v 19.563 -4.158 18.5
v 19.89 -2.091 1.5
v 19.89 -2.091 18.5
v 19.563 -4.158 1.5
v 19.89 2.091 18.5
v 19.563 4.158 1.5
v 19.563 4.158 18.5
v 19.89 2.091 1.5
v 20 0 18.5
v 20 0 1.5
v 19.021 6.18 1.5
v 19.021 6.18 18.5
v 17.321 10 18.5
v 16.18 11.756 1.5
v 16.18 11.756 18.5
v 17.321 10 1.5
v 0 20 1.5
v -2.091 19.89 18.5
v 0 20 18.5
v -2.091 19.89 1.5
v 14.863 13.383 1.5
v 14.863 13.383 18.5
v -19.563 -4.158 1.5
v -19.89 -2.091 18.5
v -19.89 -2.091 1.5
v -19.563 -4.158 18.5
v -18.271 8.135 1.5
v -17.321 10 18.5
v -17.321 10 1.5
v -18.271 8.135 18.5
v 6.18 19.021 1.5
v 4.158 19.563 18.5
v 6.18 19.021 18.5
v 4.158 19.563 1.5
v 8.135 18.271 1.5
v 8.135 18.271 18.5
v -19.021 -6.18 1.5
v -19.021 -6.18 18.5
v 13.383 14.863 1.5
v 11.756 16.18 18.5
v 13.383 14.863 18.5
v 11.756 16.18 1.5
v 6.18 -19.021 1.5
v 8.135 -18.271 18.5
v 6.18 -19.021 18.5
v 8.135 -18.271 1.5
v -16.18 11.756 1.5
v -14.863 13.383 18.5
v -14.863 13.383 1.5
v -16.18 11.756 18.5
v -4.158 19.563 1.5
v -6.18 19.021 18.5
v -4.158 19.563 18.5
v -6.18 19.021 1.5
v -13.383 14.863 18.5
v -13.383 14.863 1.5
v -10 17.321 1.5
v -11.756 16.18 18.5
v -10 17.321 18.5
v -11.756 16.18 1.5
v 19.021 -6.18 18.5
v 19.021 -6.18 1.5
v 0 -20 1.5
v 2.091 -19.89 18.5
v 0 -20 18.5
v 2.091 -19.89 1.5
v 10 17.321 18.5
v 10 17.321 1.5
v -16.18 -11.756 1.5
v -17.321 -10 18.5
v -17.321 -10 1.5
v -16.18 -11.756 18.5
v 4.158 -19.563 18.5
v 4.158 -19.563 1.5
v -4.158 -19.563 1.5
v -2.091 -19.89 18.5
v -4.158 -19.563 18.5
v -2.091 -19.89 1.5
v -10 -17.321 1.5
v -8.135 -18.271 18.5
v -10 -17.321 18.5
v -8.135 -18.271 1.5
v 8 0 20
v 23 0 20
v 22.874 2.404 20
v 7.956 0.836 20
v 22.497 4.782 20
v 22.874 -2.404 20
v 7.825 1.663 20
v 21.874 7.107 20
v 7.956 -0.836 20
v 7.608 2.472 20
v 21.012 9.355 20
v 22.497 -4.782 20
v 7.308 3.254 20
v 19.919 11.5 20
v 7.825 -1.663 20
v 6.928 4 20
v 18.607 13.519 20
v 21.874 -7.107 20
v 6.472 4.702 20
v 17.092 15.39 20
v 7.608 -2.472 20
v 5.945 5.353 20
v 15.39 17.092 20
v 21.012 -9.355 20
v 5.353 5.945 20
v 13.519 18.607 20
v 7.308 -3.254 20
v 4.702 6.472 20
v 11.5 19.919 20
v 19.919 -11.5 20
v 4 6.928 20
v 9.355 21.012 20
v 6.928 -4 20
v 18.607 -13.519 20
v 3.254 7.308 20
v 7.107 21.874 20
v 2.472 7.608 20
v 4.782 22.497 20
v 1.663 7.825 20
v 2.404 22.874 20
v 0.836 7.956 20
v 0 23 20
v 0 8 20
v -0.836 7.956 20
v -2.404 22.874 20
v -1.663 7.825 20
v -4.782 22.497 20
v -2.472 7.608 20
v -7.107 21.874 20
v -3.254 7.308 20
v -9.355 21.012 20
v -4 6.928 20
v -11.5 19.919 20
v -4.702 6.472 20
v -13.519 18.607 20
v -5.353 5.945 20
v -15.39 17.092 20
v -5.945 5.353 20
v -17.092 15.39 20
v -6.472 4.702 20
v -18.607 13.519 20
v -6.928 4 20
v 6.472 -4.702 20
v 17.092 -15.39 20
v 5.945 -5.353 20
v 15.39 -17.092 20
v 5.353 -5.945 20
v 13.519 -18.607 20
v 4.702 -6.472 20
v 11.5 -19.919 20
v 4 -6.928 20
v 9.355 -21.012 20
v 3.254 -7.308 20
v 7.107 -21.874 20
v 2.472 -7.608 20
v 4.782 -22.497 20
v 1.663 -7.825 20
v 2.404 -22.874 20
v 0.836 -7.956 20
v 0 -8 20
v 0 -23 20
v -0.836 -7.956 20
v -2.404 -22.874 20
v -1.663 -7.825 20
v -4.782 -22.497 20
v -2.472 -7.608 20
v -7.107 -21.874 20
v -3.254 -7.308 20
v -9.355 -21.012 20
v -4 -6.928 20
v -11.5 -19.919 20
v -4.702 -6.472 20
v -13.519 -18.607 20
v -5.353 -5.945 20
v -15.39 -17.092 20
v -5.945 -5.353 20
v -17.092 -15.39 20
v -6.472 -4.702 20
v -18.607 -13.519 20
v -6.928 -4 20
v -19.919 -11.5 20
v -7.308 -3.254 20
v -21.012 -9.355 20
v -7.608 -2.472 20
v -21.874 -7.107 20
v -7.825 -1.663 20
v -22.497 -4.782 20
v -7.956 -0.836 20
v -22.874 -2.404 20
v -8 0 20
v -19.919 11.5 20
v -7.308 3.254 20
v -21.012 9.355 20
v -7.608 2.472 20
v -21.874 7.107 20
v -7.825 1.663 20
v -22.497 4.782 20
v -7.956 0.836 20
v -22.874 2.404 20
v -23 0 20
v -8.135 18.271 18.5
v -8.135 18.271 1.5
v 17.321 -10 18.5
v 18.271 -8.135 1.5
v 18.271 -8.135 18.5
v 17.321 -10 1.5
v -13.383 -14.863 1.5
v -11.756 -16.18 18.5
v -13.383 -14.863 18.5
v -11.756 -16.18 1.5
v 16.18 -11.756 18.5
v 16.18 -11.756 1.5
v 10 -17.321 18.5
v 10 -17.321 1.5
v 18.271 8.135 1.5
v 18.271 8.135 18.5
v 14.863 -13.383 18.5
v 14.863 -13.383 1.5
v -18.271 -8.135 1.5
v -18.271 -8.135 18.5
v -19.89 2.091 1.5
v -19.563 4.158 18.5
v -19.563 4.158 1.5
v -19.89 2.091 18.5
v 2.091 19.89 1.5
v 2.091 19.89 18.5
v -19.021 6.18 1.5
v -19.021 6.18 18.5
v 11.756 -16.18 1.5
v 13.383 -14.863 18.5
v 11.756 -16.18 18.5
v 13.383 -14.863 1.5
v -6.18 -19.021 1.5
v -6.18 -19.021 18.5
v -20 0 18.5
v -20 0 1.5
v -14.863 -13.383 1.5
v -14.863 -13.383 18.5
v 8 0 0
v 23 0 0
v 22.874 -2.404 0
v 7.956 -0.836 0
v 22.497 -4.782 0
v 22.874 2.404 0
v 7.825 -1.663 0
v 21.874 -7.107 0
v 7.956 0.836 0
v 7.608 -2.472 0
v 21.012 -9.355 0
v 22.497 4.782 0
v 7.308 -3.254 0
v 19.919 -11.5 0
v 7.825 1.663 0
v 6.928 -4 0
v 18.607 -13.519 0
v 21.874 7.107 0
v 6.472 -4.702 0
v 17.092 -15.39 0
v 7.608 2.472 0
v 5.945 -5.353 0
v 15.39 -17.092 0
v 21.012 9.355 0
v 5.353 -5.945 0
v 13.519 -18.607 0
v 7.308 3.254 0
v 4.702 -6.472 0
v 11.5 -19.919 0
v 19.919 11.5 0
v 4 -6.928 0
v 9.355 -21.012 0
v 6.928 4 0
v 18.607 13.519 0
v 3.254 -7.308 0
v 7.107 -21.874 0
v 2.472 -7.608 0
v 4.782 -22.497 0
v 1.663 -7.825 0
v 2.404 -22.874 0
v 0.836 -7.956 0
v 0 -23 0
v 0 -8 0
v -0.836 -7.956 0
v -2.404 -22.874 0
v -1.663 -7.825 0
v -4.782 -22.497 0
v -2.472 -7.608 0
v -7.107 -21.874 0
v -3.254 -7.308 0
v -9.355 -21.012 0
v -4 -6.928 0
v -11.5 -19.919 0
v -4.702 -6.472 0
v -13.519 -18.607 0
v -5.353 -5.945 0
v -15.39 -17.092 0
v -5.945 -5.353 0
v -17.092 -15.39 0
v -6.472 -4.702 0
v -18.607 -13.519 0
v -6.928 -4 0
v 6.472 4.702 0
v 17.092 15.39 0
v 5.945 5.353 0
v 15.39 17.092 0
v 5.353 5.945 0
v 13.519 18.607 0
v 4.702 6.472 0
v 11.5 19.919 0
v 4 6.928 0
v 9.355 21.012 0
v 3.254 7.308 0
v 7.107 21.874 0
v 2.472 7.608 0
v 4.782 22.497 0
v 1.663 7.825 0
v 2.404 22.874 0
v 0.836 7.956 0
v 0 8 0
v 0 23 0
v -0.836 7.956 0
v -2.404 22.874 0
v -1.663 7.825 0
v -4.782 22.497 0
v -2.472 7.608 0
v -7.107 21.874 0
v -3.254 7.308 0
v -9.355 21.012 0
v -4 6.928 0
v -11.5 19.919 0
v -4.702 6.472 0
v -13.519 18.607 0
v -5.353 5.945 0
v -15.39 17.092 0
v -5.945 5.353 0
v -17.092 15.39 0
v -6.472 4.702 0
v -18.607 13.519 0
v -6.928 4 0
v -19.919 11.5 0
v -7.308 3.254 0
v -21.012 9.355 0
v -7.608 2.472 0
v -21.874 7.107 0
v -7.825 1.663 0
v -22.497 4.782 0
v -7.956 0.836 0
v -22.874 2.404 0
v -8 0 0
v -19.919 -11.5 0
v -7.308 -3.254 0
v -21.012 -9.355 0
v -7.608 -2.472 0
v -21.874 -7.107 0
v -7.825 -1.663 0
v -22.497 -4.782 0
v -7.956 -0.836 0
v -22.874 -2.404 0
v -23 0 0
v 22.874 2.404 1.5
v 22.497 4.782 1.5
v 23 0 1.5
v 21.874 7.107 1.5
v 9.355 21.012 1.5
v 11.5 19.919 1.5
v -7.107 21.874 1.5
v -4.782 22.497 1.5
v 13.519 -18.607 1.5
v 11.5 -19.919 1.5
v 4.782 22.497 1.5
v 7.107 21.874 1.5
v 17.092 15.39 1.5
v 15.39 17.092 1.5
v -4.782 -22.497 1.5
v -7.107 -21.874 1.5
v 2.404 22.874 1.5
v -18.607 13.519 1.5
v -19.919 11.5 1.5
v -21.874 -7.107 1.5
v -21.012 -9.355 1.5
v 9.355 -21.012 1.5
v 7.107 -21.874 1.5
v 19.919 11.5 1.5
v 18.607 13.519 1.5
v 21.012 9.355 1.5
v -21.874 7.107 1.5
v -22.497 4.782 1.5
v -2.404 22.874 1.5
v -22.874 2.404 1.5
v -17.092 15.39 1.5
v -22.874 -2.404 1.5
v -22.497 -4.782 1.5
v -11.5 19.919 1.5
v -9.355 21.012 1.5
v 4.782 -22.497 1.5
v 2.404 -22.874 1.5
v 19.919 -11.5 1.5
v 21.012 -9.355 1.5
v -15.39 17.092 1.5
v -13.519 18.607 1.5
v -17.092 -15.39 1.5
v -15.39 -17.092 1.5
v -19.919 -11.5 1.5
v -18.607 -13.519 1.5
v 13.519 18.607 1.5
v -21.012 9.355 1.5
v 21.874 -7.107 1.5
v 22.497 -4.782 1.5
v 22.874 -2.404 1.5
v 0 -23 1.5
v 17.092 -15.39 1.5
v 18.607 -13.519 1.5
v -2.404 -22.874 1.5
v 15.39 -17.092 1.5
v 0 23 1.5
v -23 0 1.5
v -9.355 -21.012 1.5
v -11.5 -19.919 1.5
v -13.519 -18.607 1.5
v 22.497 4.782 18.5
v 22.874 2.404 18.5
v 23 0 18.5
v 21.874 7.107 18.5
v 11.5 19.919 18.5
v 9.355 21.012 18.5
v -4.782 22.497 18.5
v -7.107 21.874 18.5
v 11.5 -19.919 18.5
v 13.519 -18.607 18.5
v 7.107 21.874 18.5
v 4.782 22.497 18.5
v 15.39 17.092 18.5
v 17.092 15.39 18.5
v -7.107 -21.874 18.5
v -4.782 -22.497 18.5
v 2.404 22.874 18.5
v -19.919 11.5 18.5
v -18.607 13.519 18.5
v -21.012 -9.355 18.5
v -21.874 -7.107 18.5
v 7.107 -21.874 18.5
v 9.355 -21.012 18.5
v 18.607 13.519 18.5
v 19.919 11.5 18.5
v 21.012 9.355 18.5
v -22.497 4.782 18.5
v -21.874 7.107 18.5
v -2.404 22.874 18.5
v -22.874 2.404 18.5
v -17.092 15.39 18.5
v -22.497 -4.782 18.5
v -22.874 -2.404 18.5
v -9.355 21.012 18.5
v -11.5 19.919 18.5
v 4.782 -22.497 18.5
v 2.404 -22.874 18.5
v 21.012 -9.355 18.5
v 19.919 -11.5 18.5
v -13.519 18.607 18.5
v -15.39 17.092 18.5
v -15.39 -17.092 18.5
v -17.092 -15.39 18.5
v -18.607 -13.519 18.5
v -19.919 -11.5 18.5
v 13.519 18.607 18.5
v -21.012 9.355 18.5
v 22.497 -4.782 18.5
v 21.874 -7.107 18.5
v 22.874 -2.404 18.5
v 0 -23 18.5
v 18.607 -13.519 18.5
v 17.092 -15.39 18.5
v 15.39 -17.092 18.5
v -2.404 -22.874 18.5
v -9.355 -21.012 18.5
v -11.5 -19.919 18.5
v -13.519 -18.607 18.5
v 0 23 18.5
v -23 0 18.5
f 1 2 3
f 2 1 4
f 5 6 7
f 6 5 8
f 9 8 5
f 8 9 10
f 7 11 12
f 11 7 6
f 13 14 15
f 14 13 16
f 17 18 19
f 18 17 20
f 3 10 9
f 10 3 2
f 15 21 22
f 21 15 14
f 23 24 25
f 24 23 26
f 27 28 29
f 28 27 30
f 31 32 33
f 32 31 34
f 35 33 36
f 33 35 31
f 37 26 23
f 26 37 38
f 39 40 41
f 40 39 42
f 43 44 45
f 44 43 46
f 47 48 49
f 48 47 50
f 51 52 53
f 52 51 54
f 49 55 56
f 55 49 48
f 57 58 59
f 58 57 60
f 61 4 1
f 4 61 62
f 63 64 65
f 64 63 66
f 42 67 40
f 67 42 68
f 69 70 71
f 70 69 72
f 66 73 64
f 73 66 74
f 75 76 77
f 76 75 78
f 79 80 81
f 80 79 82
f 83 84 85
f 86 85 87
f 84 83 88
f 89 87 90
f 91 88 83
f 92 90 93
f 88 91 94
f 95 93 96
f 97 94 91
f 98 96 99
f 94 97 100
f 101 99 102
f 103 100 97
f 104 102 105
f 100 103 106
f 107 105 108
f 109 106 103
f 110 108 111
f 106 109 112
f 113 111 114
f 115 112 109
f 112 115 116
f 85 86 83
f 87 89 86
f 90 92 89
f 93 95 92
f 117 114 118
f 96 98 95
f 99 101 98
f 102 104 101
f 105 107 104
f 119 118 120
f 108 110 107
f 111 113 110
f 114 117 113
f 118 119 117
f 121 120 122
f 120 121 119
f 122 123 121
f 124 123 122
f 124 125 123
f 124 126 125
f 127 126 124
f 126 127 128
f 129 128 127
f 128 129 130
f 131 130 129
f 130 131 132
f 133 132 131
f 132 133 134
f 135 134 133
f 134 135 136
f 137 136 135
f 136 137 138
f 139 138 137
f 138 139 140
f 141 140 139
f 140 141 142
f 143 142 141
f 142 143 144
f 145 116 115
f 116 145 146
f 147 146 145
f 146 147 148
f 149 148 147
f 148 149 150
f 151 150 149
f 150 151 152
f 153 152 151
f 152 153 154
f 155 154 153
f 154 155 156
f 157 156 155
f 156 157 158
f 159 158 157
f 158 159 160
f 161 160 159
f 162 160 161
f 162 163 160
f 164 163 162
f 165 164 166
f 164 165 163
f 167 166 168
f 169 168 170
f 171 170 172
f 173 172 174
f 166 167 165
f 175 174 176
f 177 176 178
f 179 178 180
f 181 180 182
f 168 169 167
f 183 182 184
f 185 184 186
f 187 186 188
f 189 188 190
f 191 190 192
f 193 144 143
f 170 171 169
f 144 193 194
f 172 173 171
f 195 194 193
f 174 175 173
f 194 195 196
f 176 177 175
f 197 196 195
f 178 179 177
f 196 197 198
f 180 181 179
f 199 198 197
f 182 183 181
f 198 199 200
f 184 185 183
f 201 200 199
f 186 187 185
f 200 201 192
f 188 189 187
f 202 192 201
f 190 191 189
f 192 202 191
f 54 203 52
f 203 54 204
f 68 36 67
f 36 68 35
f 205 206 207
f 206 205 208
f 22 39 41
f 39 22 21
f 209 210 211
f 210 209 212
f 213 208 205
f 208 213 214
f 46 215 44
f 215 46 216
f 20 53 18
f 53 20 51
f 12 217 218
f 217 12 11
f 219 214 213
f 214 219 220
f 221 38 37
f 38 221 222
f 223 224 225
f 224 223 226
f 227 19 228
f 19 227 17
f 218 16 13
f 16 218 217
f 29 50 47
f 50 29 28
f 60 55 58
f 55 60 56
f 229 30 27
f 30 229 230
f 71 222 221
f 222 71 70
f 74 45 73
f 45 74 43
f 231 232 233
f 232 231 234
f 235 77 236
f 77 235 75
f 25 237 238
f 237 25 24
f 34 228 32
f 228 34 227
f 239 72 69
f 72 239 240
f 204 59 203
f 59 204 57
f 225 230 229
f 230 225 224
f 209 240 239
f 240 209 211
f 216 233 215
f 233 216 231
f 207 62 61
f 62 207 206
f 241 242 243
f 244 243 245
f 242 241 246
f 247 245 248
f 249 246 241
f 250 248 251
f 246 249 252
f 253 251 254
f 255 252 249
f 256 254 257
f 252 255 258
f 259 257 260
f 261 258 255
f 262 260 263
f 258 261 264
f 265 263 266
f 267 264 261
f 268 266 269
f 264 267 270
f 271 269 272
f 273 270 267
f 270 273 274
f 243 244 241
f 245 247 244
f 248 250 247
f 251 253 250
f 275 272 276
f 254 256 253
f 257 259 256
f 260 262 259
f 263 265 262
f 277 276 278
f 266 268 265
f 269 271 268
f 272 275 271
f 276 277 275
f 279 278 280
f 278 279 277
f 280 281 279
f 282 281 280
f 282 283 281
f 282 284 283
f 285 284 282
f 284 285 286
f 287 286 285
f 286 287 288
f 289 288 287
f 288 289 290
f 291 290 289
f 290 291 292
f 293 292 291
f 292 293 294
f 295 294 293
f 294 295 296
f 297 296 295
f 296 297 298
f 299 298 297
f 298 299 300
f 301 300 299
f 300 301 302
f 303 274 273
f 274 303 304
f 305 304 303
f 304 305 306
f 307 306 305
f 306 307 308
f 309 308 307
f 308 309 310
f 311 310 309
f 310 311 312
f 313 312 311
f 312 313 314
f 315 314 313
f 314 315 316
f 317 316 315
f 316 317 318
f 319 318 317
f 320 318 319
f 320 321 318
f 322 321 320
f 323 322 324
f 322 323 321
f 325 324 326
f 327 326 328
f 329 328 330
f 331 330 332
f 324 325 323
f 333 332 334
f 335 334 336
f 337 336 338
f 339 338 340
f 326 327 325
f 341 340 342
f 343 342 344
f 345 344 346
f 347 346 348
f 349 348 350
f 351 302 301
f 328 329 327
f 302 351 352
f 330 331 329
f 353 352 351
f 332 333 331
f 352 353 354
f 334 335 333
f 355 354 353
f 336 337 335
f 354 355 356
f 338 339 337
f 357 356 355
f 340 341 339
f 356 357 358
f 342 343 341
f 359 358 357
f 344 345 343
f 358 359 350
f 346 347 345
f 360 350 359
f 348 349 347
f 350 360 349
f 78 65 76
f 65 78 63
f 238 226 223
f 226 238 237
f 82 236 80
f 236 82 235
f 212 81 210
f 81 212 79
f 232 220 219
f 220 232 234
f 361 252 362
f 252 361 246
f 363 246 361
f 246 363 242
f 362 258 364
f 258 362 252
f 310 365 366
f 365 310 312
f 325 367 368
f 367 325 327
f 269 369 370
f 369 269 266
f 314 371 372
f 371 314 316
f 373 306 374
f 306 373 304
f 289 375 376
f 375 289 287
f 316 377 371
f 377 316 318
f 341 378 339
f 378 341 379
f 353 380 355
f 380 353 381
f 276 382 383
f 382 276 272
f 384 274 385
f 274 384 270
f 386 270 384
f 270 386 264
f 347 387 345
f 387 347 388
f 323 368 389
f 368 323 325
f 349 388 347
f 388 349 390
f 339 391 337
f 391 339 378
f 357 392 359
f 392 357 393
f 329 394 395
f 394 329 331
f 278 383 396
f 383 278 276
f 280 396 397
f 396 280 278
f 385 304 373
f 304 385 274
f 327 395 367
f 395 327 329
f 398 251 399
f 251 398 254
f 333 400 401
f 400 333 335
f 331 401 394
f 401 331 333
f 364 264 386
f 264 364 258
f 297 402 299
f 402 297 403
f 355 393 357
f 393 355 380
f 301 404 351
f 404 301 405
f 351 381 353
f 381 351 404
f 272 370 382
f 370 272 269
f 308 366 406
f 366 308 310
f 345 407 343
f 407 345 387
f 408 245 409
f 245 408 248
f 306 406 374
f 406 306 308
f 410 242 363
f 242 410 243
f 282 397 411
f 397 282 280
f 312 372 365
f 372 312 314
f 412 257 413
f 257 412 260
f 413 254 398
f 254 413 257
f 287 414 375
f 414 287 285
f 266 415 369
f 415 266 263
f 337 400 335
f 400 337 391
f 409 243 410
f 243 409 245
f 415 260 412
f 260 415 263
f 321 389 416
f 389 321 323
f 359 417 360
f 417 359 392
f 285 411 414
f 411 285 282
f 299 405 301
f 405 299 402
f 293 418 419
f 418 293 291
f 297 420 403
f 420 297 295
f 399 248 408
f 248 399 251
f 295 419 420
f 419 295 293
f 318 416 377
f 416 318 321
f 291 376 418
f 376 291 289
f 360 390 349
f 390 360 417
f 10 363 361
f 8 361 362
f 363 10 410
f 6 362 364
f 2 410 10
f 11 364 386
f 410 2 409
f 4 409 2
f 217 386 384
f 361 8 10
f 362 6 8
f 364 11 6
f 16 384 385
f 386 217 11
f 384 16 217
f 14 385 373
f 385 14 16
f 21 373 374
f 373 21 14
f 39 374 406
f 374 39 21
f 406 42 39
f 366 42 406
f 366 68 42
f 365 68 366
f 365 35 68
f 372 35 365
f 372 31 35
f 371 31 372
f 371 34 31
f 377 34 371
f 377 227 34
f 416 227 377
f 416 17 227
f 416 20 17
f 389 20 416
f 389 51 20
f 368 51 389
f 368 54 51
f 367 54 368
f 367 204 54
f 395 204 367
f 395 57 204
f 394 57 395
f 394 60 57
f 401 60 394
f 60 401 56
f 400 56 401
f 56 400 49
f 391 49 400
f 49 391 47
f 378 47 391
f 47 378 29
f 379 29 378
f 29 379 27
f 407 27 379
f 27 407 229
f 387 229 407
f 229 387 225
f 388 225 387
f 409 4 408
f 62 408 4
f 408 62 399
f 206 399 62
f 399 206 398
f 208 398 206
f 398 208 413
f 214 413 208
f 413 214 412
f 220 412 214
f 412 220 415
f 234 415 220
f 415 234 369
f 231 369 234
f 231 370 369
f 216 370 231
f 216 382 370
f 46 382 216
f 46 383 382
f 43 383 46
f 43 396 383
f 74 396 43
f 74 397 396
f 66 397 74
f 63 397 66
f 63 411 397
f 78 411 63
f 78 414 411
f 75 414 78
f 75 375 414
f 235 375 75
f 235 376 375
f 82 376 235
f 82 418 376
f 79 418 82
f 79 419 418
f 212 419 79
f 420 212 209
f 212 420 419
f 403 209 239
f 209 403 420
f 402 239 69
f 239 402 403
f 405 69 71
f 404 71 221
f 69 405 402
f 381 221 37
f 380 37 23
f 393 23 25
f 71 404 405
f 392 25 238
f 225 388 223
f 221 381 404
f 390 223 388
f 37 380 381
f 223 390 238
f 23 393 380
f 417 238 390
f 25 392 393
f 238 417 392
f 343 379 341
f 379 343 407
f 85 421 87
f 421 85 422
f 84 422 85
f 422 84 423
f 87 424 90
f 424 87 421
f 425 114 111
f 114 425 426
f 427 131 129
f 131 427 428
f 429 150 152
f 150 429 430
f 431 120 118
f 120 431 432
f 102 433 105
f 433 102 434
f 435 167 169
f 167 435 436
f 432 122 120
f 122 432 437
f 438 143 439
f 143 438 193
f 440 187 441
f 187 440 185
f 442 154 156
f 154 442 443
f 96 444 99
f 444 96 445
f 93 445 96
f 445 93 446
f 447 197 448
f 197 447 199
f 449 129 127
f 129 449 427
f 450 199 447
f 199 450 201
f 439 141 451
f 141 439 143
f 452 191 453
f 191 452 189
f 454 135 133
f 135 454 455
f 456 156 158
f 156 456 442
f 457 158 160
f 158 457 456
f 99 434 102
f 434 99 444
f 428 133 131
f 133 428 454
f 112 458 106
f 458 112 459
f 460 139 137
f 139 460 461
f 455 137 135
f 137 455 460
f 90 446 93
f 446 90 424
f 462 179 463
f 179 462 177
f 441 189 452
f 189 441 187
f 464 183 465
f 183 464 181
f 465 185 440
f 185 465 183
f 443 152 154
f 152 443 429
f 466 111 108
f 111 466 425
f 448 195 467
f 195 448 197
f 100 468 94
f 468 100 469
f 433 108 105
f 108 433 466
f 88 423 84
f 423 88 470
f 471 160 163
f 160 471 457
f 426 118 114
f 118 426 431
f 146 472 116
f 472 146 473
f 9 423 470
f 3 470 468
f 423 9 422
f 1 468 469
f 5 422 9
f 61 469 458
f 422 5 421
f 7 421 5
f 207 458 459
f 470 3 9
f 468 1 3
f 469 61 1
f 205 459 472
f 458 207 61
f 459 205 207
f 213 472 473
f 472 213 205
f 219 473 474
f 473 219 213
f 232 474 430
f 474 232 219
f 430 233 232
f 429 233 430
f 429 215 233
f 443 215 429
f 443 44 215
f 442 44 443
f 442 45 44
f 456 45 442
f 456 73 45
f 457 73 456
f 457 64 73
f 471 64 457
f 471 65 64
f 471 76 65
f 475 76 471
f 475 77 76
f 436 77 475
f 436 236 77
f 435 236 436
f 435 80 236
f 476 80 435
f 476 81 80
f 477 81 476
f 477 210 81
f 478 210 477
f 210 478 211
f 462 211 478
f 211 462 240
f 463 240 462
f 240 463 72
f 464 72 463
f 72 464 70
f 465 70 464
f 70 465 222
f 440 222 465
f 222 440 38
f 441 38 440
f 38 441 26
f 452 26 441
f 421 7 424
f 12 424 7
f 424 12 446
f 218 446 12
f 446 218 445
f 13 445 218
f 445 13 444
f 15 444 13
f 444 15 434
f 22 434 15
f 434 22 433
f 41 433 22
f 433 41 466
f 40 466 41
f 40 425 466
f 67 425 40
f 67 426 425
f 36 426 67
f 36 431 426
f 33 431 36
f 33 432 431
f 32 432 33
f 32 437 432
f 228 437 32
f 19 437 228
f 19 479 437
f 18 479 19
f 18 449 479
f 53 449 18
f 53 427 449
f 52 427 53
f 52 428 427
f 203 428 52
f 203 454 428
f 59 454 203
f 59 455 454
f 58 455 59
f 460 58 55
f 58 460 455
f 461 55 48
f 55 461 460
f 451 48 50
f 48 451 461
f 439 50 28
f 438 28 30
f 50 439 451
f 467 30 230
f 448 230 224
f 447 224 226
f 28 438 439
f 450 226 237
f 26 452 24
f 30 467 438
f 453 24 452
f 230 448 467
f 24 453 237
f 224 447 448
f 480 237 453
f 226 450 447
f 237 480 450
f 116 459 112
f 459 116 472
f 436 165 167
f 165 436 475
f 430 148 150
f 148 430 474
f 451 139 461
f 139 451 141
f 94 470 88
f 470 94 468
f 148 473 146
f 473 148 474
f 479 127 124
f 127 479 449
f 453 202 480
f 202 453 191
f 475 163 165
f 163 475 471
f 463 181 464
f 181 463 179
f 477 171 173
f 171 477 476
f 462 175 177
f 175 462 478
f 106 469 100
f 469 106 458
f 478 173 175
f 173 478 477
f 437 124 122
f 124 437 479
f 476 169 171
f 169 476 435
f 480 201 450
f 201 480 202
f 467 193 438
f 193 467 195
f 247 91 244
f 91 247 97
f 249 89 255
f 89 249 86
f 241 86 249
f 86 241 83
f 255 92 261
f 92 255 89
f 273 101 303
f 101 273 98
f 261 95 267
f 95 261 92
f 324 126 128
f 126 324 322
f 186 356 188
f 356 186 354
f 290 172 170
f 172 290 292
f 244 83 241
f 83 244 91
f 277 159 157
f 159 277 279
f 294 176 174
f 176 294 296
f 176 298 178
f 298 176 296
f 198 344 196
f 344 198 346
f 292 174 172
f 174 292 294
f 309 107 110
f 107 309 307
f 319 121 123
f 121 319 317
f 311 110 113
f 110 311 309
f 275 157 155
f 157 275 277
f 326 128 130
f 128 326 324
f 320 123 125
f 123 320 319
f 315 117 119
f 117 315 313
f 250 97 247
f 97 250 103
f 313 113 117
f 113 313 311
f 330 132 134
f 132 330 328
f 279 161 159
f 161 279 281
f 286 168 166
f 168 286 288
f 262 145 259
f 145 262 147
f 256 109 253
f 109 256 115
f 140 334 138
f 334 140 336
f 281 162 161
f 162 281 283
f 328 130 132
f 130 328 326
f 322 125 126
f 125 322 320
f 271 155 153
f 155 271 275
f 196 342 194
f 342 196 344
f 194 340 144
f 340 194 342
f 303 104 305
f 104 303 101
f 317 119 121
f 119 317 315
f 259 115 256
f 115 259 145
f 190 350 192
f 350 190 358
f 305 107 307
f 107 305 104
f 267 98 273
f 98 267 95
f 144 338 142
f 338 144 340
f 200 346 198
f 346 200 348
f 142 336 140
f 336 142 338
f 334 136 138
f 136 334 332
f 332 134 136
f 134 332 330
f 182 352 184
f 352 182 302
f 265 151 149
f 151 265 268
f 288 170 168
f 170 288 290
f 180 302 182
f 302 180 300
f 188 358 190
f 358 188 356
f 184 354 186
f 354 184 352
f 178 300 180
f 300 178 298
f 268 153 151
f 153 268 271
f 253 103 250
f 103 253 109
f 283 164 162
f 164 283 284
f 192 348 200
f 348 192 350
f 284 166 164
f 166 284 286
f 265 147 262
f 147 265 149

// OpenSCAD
// Belt-guide pulley flange.
$fn = 60;
eps = 0.02;
bore_d = 16;
body_d = 40;
width = 20;
difference() { union() { cylinder(d=body_d,h=width); cylinder(d=body_d+6,h=1.5); translate([0,0,width-1.5]) cylinder(d=body_d+6,h=1.5); } translate([0,0,-eps]) cylinder(d=bore_d,h=width+2*eps); }
